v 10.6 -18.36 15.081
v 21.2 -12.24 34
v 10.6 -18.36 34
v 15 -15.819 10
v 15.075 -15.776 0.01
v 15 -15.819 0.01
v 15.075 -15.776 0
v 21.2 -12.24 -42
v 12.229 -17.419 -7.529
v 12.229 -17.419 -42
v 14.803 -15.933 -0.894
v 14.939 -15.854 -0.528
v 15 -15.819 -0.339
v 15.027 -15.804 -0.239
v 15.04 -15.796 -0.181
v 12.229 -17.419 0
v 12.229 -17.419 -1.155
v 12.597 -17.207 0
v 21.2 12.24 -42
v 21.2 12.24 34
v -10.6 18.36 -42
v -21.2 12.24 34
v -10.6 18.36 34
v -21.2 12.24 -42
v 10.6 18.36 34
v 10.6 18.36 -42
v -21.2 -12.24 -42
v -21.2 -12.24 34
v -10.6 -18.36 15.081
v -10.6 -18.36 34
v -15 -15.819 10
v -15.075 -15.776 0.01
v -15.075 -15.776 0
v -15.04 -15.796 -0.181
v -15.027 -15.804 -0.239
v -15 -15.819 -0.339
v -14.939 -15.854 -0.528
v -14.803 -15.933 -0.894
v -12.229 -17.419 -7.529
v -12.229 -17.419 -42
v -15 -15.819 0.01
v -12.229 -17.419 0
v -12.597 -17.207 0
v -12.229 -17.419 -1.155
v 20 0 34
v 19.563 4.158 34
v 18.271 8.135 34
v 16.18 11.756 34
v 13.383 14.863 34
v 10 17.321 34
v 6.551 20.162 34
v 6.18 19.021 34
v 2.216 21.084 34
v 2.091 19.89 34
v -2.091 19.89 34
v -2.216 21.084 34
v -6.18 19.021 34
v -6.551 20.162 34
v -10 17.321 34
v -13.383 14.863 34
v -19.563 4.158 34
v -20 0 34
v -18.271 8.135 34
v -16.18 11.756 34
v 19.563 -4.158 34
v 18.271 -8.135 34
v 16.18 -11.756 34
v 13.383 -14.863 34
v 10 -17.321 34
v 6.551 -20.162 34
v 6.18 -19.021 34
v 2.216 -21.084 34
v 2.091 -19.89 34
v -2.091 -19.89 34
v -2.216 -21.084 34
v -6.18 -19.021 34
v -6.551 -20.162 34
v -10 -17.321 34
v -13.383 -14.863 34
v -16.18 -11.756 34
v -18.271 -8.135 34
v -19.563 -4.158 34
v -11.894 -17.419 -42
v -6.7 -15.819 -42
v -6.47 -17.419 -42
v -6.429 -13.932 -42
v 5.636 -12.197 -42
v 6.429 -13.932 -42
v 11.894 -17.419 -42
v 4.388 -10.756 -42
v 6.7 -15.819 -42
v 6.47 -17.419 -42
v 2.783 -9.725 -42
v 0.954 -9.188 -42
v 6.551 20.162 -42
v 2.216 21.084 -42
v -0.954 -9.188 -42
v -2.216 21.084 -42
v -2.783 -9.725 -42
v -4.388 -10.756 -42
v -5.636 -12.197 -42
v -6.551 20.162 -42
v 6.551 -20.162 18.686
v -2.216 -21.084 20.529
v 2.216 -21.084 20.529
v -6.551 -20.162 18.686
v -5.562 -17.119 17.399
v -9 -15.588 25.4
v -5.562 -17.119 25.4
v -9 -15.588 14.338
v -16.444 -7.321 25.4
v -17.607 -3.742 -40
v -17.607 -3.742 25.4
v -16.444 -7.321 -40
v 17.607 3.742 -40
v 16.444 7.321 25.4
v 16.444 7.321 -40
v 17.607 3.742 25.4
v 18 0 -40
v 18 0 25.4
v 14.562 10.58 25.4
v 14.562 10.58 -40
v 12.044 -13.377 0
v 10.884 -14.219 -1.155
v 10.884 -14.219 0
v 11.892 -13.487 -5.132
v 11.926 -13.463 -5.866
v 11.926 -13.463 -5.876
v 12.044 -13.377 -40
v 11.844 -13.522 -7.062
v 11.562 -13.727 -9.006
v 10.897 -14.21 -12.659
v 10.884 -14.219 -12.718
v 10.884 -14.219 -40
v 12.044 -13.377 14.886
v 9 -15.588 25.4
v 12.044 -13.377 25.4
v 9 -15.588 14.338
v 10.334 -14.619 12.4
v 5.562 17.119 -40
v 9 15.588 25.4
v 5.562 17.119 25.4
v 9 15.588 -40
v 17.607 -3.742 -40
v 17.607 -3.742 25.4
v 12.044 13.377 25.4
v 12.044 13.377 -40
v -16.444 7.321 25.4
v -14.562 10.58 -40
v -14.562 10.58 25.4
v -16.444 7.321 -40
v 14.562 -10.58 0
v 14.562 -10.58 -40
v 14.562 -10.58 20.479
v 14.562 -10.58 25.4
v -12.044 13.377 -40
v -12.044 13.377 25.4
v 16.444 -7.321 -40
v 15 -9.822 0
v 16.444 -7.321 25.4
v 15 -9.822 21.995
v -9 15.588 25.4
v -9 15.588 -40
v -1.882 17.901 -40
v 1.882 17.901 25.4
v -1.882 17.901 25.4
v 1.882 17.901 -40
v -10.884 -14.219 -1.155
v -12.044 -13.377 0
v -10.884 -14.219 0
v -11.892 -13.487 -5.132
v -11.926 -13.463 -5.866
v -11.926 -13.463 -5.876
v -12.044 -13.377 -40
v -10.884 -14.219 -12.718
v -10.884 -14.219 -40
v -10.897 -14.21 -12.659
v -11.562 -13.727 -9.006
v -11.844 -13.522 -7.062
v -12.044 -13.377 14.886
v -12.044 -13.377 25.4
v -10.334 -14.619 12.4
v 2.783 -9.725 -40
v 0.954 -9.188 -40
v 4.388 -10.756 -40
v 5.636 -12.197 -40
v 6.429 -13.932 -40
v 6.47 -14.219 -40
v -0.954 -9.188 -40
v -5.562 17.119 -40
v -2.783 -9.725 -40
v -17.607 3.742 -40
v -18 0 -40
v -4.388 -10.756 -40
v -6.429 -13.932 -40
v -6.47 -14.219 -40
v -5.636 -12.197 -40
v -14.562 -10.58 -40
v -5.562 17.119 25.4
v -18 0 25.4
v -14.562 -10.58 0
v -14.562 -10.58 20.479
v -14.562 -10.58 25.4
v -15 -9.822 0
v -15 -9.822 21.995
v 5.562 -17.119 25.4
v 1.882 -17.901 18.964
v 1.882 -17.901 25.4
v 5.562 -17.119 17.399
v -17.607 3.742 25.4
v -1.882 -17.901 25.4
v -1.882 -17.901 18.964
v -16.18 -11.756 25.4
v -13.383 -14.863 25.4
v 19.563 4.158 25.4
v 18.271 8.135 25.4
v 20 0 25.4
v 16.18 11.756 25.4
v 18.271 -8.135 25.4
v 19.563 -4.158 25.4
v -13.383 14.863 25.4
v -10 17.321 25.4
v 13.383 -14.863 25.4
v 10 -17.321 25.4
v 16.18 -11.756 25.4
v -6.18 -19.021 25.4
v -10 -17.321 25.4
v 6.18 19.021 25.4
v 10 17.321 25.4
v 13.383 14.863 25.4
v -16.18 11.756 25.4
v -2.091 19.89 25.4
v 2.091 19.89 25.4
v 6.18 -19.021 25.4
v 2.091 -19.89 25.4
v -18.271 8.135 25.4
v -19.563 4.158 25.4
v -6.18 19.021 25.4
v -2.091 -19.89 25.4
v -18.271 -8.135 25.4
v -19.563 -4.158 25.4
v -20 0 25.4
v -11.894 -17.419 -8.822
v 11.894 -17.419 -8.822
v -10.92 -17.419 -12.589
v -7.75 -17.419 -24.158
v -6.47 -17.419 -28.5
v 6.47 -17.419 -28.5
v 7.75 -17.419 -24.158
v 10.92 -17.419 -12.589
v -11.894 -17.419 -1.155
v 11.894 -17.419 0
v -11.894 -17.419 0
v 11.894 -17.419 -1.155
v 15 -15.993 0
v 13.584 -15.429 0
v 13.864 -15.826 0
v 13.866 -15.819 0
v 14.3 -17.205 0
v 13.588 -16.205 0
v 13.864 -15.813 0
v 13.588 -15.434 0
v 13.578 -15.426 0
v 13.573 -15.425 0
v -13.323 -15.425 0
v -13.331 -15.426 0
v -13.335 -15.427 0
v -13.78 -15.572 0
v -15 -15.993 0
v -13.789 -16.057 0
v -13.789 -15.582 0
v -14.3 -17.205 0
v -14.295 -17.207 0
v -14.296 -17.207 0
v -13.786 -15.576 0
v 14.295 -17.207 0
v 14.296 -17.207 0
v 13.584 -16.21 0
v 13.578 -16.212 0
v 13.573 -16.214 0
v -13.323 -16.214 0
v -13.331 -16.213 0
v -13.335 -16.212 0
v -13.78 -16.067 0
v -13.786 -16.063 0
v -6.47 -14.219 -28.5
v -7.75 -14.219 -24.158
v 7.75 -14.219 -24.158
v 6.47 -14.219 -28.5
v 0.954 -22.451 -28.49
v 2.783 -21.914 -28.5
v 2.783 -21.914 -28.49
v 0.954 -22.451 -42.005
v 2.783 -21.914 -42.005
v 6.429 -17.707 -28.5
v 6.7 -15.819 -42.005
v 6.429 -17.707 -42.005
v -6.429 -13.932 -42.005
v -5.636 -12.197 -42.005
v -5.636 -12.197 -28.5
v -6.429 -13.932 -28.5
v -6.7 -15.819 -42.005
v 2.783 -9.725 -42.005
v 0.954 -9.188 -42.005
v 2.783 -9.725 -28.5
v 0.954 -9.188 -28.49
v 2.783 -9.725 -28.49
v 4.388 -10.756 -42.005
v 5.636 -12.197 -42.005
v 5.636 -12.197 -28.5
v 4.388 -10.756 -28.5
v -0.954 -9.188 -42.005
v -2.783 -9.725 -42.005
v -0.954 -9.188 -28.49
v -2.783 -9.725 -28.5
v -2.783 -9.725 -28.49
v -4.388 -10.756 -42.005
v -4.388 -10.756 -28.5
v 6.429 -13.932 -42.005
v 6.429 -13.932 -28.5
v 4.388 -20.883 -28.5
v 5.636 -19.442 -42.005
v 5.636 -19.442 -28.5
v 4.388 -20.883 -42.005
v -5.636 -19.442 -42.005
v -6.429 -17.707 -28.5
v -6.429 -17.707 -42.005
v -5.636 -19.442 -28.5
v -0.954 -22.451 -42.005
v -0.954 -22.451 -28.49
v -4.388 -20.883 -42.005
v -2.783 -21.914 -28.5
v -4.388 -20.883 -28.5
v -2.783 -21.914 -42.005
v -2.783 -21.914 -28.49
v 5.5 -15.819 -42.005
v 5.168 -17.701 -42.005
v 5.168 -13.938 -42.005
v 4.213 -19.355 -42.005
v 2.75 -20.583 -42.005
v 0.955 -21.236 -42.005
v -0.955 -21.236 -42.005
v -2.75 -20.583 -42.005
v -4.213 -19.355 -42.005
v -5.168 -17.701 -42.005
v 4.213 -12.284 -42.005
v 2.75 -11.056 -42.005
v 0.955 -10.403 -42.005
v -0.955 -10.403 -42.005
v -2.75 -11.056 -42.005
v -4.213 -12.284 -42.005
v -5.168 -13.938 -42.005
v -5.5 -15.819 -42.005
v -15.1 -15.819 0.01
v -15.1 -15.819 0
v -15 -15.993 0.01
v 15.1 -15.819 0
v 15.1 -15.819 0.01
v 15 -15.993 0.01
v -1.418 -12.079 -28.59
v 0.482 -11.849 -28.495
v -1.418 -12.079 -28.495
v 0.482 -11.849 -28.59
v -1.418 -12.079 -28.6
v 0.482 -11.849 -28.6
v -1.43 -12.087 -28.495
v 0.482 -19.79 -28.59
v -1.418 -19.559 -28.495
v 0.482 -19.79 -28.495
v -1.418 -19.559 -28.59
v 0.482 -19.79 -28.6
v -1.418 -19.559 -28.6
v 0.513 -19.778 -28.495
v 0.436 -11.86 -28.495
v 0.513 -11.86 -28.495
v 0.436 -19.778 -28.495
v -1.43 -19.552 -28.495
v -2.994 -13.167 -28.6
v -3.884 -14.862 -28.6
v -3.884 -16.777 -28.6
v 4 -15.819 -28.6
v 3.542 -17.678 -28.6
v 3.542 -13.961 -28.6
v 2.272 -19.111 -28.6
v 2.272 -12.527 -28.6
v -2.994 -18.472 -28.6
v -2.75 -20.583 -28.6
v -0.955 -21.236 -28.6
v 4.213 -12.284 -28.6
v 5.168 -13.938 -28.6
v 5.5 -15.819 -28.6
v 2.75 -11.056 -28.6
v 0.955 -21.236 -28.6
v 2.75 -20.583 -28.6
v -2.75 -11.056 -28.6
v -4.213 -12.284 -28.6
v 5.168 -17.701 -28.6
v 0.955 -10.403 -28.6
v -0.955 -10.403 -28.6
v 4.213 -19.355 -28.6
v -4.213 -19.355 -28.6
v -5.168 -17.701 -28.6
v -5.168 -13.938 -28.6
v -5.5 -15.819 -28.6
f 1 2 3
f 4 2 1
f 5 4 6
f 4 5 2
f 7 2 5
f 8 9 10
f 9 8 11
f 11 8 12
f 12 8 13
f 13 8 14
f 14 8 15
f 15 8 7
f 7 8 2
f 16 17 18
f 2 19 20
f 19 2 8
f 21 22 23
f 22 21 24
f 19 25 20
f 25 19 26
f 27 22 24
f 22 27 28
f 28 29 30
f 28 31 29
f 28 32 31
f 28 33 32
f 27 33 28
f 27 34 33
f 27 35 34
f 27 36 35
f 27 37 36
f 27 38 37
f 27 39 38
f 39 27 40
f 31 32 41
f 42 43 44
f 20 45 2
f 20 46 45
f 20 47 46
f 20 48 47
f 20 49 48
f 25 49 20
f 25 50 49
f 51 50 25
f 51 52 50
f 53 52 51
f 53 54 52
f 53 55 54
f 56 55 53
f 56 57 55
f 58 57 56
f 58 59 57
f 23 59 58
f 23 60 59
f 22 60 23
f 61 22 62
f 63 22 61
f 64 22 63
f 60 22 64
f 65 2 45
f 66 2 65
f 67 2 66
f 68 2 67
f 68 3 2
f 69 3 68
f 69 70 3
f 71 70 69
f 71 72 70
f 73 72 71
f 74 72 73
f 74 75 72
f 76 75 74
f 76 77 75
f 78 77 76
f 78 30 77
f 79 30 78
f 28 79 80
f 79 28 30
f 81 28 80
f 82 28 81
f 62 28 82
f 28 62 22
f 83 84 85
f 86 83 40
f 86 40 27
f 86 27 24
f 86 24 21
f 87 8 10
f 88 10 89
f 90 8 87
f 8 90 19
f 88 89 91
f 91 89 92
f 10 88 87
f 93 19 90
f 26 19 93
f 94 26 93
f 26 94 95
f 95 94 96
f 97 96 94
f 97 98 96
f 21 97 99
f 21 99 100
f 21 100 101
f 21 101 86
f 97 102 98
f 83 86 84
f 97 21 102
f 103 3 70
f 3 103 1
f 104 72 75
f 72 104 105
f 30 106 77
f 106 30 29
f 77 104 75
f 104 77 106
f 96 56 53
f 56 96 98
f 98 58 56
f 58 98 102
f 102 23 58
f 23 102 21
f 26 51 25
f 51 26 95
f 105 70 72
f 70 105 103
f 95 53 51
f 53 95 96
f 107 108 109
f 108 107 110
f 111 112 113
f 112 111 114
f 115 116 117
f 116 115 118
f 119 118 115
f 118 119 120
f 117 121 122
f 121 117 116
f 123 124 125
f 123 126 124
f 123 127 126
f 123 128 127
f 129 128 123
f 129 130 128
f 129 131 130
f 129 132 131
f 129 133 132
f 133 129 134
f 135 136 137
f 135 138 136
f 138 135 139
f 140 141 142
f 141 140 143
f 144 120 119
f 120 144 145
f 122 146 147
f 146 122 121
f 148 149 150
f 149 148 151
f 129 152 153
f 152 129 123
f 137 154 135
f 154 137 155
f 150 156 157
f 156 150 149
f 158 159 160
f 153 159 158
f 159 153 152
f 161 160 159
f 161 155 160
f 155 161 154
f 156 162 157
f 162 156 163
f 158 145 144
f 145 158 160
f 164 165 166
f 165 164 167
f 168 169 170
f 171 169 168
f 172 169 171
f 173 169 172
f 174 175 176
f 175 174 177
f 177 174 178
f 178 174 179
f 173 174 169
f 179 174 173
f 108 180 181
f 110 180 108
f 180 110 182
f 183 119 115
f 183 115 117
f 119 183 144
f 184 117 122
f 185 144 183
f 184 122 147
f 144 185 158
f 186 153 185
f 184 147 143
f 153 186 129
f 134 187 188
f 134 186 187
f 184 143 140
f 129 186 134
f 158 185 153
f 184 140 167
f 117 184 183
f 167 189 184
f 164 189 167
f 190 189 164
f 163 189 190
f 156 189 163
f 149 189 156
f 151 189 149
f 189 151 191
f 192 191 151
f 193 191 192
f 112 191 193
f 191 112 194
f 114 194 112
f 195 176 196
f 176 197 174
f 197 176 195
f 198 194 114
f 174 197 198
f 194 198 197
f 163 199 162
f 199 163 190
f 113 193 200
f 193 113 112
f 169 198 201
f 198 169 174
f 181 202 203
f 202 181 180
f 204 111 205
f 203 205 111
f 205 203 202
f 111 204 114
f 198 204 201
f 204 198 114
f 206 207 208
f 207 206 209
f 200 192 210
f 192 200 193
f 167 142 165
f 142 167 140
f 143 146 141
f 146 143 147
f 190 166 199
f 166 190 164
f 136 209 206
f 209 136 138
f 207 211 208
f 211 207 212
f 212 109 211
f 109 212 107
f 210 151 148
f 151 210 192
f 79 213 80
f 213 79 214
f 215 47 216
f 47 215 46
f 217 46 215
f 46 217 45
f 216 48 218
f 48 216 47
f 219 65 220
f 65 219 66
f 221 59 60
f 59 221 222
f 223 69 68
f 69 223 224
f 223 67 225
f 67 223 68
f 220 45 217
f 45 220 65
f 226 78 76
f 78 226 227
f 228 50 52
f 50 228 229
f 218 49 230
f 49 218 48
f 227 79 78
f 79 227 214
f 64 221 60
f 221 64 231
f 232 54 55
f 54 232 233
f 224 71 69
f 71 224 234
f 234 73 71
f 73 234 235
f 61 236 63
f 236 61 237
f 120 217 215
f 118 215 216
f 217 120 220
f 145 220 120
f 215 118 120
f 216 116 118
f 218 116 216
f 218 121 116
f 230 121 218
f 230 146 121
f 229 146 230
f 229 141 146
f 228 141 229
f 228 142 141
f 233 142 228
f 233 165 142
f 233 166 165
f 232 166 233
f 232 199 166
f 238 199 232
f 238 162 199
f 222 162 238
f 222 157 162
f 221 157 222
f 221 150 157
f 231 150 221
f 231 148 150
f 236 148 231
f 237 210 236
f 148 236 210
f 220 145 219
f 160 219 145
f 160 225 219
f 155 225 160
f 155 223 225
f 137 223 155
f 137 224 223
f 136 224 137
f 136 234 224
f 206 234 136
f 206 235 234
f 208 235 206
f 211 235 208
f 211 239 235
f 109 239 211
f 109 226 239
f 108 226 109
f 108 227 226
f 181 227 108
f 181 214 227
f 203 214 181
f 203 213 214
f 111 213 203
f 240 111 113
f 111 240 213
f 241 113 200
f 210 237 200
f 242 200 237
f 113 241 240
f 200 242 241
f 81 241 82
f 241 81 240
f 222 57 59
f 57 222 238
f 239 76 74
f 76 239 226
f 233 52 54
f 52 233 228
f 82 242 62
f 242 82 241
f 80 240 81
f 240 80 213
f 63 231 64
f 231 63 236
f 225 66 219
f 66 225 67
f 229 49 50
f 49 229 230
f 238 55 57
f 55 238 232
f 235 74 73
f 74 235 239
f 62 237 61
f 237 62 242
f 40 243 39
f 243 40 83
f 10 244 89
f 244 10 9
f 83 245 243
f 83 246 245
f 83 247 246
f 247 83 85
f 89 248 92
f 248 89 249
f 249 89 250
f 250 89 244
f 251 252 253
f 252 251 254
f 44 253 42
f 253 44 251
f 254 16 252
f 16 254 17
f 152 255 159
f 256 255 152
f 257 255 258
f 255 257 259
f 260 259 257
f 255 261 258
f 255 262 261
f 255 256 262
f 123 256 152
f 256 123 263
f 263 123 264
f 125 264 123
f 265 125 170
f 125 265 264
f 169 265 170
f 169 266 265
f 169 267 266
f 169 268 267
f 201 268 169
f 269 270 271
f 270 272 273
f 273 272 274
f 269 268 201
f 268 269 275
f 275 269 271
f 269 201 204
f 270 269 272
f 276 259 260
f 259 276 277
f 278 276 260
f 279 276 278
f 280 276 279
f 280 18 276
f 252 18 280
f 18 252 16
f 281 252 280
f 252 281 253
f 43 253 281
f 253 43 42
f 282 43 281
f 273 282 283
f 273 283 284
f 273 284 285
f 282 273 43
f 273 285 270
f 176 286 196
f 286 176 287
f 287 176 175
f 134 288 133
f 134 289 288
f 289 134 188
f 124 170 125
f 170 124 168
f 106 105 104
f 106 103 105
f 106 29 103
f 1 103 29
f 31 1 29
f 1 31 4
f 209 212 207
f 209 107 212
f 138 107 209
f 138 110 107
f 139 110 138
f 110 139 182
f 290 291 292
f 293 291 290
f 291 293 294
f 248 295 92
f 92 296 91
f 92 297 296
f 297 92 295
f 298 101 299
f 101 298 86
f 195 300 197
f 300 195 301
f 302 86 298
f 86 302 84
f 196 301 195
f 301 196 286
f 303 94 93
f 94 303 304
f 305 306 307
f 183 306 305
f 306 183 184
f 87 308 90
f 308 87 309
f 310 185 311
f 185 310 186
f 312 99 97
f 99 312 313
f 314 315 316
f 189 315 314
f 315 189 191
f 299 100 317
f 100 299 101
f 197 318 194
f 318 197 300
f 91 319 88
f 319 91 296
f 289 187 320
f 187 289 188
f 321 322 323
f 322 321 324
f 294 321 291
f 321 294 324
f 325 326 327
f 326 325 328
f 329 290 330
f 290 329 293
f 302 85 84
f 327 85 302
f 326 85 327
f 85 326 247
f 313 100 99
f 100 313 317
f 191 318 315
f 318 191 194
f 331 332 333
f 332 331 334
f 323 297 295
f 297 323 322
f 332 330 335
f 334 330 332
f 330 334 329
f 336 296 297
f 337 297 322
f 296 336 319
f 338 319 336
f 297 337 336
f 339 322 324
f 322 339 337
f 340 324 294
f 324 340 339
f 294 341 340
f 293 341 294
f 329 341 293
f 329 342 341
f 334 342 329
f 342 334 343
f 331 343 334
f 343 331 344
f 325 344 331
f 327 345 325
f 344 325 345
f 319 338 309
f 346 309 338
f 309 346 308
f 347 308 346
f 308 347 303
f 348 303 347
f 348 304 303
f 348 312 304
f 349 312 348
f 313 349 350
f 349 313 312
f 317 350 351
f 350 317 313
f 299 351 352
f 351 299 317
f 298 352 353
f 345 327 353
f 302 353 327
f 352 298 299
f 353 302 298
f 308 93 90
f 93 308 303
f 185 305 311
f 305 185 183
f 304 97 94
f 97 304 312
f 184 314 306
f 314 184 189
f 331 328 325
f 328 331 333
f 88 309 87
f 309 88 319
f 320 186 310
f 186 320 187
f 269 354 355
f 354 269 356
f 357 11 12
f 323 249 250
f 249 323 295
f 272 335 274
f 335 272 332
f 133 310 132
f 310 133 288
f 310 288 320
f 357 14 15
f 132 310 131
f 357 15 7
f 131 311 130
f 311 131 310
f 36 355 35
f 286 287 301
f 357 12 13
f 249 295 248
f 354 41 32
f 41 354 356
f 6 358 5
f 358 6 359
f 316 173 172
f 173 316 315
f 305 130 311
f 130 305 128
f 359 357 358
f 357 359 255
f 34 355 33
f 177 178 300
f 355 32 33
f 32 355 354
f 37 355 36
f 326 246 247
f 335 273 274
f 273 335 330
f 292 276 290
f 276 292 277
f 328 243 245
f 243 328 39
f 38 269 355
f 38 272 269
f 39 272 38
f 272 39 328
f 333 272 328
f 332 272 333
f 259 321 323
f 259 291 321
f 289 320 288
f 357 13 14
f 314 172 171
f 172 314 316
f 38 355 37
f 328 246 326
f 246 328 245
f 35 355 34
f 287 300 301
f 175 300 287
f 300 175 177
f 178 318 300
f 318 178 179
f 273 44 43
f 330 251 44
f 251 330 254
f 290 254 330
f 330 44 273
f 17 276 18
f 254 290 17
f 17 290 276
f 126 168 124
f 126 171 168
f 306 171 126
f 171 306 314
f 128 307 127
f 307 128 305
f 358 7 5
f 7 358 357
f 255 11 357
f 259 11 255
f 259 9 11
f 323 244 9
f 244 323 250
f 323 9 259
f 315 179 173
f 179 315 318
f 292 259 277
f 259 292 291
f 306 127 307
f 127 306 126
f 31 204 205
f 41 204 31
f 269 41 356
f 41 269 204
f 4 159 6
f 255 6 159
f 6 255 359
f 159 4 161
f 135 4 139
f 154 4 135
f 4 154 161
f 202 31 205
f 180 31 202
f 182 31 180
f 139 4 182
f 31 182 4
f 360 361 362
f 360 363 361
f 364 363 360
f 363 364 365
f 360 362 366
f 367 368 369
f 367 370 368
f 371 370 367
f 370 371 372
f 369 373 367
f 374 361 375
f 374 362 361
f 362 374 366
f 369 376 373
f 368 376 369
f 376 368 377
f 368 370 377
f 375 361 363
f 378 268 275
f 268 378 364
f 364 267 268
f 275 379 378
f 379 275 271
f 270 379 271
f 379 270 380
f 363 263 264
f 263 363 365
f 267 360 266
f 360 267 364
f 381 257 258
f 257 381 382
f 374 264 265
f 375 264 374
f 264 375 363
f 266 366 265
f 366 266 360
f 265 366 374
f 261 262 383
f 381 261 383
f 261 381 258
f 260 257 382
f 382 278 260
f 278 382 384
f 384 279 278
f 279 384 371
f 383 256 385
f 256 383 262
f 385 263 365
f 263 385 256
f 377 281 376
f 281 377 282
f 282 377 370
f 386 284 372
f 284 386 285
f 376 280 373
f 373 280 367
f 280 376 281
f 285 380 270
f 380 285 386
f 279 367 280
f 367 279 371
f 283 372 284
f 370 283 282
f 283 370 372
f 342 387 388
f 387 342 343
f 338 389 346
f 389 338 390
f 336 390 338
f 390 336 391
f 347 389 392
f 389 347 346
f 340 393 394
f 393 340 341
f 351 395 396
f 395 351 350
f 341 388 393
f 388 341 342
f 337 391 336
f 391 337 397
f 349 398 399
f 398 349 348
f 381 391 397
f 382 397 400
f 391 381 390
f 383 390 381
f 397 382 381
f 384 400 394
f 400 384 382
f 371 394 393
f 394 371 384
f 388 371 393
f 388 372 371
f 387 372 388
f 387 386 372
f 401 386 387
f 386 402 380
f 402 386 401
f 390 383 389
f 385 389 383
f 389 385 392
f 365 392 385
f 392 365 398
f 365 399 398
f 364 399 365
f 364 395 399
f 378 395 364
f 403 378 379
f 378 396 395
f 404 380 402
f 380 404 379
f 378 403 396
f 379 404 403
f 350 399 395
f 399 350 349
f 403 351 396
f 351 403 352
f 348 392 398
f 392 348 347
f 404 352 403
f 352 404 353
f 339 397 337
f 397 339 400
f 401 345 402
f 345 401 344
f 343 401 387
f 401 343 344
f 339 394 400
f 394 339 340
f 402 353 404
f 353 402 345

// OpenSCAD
// file: OpenSCAD_support/straight_flue.scad
// straight loft and accesoires 

module curvedFlueLoft(upperDiameter, lowerDiameter, loftCeiling, loftFloor){
    union(){
        // tube
        hull(){
        	translate([0, airSupplyY, loftFloor]) 
                cylinder(h=0.01, d=lowerDiameter, center=true);
        	translate([0, airSupplyY, (ground + tubeInsert)])
                cylinder(h=0.01, d=lowerDiameter, center=true);
        }
        // straight flue
            hull(){
            translate ([labiumWidth*-0.45, airSupplyY, loftCeiling]) 
                cylinder (0.01, d=upperDiameter);
            translate ([labiumWidth*0.45, airSupplyY, loftCeiling]) 
                cylinder (0.01, d=upperDiameter);
            translate ([0, airSupplyY, (loftFloor + tubeInsert)]) 
                cylinder (0.01, d=lowerDiameter);
        };
    };
}

module outer_straight_flue(){
    curvedFlueLoft(    
        upperDiameter = (flueWidth + 2 * minWallThickness), 
        lowerDiameter = (outerTube + 2 * minWallThickness),
        loftCeiling = 0,
        loftFloor = ground
    );
}

module inner_straight_flue(){
    curvedFlueLoft(
        upperDiameter = flueWidth, 
        lowerDiameter = innerTube, 
        loftCeiling = 0.1, 
        loftFloor = (ground-0.1)
    ); 
}

module straight_flue_fill(){
translate ([0, 0, ground])
    intersection(){
        cylinder(height, d=(outerDiameter + 2* minWallThickness));
        translate([labiumWidth*-0.5, airSupplyY - 0.5 * flueWidth - minWallThickness, 0])
            cube([labiumWidth, flueWidth + 2*minWallThickness, floorThickness + lengthFlue]);
    } 
}
// file: OpenSCAD_support/straight_labium.scad
// straight labium cut and accesoires

module straight_labium_cut(){
    intersection(){
        translate ([-labiumWidth/2,0,0])
            rotate([90, 0, 90])
                linear_extrude(labiumWidth, $fn=50) 
                    polygon(points = labium_polygon_points);
        translate([labiumWidth*-0.25, 2*airSupplyY - labiumWidth*0.25, 0]) 
            minkowski(){
                cube([labiumWidth/2, -2*airSupplyY, -2*airSupplyY]);
                cylinder(r=labiumWidth/4,h=-2*airSupplyY);
            }
    }
};

module straight_labium_fill(){
    intersection(){
        translate ([-labiumWidth/2,0,0])
            rotate([90, 0, 90])
                linear_extrude(labiumWidth, $fn=50) 
                    polygon(points = labium_plus_points);
        cylinder(outerDiameter, d=outerDiameter);
    }
}
// file: OpenSCAD_support/common.scad
module basicShape(height)
translate ([0, 0, ground]) union(){
    difference(){
	   	union(){
	        intersection(){
	            rotate ([0, 0, 30]) 
                    cylinder_outer(height, (outerDiameter*0.5+minWallThickness), 6);
	            translate ([0,0,(height/2)]) 
                    cube ([outerDiameter*2, (sqrt(3)*(outerDiameter*0.5+minWallThickness)), height], center = true);
	 	    };
	        cylinder(height, d=(outerDiameter + 2* minWallThickness)); 
	   	};
        union(){
        	translate ([0, 0, floorThickness]) 
                cylinder(height, d=innerDiameter, center=false);
        	translate ([0, 0, (height - pipeInsert)]) 
                cylinder(height, d=outerDiameter, center=false);
        };
    };
};

module basicShapeFlat(height)
translate ([0, 0, ground]) union(){
    difference(){
        union(){
            intersection(){
                rotate ([0, 0, 30]) 
                    cylinder_outer(height, (outerDiameter*0.5+minWallThickness), 6);
                translate ([0,0,(height/2)]) 
                    cube ([outerDiameter*2, (sqrt(3)*(outerDiameter*0.5+minWallThickness)), height], center = true);
            };
            cylinder(height, d=(outerDiameter + 2* minWallThickness)); 
        };
        union(){
            translate ([0, 0, floorThickness]) 
                cylinder(height, d=innerDiameter, center=false);
            translate ([0, 0, (height - pipeInsert)]) 
                cylinder(height, d=outerDiameter, center=false);
            translate([outerDiameter*-1, airSupplyY - outerDiameter - minWallThickness - flueWidth*0.5, -0.1])
                cube([outerDiameter*2, outerDiameter, floorThickness + lengthFlue + 0.2]);
        };
    };
};

module cylinder_outer(height,radius,fn){  	//from https://en.wikibooks.org/wiki/OpenSCAD_User_Manual/undersized_circular_objects
   fudge = 1/cos(180/fn);
   cylinder(h=height,r=radius*fudge,$fn=fn);
}
   
module airSupplySpacer(){
    translate ([0, airSupplyY, (ground-0.1)]) 
    cylinder (tubeInsert, d=outerTube, center=false);
}
// main file
// flue pippe. work in progress.

include <OpenSCAD_support/common.scad>
include <OpenSCAD_support/straight_labium.scad>
include <OpenSCAD_support/straight_flue.scad>

// variables
outerDiameter = 40;
innerDiameter = 36;
labiumWidth = 30;
outCut = 10;
lengthFlue = 40; // coordinate this with the frequency
outerTube = 11;
innerTube = 8;
minWallThickness = 1.2;
floorThickness = 2;
flueWidth = 0.8;

// proportions, are most likely good like that
tubeInsert = outerTube + 2.5;       // length
pipeInsert = innerDiameter * 0.1 + 5; // length
height = floorThickness
    + lengthFlue
    + outCut 
    + outerDiameter *0.3
    + labiumWidth *0.4; 
    
// calculations, don't touch in production use
labium_angle = labiumWidth * 360 / outerDiameter / PI;
ground = (lengthFlue + floorThickness)*-1;
soundingLength = height - pipeInsert - floorThickness;
airSupplyY = labium_angle > 60 ? 
    1/cos(30) * (outerDiameter*-0.5 - minWallThickness) + labiumWidth * tan(30) * 0.5 : 
    sqrt((outerDiameter+2*minWallThickness)*(outerDiameter+2*minWallThickness) 
    - labiumWidth*labiumWidth)/-2; 
labium_polygon_points = 
    [[0,0],
    [0, outCut - 2*airSupplyY],
    [airSupplyY, outCut],
    [2*airSupplyY, outCut - 2*airSupplyY],
    [2*airSupplyY,0]];
labium_plus_points = 
    [[2*airSupplyY, outCut - 2*airSupplyY],
    [2*airSupplyY + minWallThickness, outCut - 2*airSupplyY + 2*minWallThickness],
    [airSupplyY + minWallThickness, outCut + 2*minWallThickness],
    [airSupplyY, outCut]];

// announcing sounding length
echo(str("the sounding length inside the model in mm: ", soundingLength));

// flueLength warning
if (lengthFlue < outerTube * 2)
    echo("lengthFlue is too short");

// logic
difference(){
    union(){                    // fusion plus
        basicShapeFlat(height); 
        straight_flue_fill();
        straight_labium_fill();
        outer_straight_flue();
    };
    union(){                    // fusion minus
        straight_labium_cut();
        inner_straight_flue(); 
        airSupplySpacer();
    };
};

echo(version = version());
